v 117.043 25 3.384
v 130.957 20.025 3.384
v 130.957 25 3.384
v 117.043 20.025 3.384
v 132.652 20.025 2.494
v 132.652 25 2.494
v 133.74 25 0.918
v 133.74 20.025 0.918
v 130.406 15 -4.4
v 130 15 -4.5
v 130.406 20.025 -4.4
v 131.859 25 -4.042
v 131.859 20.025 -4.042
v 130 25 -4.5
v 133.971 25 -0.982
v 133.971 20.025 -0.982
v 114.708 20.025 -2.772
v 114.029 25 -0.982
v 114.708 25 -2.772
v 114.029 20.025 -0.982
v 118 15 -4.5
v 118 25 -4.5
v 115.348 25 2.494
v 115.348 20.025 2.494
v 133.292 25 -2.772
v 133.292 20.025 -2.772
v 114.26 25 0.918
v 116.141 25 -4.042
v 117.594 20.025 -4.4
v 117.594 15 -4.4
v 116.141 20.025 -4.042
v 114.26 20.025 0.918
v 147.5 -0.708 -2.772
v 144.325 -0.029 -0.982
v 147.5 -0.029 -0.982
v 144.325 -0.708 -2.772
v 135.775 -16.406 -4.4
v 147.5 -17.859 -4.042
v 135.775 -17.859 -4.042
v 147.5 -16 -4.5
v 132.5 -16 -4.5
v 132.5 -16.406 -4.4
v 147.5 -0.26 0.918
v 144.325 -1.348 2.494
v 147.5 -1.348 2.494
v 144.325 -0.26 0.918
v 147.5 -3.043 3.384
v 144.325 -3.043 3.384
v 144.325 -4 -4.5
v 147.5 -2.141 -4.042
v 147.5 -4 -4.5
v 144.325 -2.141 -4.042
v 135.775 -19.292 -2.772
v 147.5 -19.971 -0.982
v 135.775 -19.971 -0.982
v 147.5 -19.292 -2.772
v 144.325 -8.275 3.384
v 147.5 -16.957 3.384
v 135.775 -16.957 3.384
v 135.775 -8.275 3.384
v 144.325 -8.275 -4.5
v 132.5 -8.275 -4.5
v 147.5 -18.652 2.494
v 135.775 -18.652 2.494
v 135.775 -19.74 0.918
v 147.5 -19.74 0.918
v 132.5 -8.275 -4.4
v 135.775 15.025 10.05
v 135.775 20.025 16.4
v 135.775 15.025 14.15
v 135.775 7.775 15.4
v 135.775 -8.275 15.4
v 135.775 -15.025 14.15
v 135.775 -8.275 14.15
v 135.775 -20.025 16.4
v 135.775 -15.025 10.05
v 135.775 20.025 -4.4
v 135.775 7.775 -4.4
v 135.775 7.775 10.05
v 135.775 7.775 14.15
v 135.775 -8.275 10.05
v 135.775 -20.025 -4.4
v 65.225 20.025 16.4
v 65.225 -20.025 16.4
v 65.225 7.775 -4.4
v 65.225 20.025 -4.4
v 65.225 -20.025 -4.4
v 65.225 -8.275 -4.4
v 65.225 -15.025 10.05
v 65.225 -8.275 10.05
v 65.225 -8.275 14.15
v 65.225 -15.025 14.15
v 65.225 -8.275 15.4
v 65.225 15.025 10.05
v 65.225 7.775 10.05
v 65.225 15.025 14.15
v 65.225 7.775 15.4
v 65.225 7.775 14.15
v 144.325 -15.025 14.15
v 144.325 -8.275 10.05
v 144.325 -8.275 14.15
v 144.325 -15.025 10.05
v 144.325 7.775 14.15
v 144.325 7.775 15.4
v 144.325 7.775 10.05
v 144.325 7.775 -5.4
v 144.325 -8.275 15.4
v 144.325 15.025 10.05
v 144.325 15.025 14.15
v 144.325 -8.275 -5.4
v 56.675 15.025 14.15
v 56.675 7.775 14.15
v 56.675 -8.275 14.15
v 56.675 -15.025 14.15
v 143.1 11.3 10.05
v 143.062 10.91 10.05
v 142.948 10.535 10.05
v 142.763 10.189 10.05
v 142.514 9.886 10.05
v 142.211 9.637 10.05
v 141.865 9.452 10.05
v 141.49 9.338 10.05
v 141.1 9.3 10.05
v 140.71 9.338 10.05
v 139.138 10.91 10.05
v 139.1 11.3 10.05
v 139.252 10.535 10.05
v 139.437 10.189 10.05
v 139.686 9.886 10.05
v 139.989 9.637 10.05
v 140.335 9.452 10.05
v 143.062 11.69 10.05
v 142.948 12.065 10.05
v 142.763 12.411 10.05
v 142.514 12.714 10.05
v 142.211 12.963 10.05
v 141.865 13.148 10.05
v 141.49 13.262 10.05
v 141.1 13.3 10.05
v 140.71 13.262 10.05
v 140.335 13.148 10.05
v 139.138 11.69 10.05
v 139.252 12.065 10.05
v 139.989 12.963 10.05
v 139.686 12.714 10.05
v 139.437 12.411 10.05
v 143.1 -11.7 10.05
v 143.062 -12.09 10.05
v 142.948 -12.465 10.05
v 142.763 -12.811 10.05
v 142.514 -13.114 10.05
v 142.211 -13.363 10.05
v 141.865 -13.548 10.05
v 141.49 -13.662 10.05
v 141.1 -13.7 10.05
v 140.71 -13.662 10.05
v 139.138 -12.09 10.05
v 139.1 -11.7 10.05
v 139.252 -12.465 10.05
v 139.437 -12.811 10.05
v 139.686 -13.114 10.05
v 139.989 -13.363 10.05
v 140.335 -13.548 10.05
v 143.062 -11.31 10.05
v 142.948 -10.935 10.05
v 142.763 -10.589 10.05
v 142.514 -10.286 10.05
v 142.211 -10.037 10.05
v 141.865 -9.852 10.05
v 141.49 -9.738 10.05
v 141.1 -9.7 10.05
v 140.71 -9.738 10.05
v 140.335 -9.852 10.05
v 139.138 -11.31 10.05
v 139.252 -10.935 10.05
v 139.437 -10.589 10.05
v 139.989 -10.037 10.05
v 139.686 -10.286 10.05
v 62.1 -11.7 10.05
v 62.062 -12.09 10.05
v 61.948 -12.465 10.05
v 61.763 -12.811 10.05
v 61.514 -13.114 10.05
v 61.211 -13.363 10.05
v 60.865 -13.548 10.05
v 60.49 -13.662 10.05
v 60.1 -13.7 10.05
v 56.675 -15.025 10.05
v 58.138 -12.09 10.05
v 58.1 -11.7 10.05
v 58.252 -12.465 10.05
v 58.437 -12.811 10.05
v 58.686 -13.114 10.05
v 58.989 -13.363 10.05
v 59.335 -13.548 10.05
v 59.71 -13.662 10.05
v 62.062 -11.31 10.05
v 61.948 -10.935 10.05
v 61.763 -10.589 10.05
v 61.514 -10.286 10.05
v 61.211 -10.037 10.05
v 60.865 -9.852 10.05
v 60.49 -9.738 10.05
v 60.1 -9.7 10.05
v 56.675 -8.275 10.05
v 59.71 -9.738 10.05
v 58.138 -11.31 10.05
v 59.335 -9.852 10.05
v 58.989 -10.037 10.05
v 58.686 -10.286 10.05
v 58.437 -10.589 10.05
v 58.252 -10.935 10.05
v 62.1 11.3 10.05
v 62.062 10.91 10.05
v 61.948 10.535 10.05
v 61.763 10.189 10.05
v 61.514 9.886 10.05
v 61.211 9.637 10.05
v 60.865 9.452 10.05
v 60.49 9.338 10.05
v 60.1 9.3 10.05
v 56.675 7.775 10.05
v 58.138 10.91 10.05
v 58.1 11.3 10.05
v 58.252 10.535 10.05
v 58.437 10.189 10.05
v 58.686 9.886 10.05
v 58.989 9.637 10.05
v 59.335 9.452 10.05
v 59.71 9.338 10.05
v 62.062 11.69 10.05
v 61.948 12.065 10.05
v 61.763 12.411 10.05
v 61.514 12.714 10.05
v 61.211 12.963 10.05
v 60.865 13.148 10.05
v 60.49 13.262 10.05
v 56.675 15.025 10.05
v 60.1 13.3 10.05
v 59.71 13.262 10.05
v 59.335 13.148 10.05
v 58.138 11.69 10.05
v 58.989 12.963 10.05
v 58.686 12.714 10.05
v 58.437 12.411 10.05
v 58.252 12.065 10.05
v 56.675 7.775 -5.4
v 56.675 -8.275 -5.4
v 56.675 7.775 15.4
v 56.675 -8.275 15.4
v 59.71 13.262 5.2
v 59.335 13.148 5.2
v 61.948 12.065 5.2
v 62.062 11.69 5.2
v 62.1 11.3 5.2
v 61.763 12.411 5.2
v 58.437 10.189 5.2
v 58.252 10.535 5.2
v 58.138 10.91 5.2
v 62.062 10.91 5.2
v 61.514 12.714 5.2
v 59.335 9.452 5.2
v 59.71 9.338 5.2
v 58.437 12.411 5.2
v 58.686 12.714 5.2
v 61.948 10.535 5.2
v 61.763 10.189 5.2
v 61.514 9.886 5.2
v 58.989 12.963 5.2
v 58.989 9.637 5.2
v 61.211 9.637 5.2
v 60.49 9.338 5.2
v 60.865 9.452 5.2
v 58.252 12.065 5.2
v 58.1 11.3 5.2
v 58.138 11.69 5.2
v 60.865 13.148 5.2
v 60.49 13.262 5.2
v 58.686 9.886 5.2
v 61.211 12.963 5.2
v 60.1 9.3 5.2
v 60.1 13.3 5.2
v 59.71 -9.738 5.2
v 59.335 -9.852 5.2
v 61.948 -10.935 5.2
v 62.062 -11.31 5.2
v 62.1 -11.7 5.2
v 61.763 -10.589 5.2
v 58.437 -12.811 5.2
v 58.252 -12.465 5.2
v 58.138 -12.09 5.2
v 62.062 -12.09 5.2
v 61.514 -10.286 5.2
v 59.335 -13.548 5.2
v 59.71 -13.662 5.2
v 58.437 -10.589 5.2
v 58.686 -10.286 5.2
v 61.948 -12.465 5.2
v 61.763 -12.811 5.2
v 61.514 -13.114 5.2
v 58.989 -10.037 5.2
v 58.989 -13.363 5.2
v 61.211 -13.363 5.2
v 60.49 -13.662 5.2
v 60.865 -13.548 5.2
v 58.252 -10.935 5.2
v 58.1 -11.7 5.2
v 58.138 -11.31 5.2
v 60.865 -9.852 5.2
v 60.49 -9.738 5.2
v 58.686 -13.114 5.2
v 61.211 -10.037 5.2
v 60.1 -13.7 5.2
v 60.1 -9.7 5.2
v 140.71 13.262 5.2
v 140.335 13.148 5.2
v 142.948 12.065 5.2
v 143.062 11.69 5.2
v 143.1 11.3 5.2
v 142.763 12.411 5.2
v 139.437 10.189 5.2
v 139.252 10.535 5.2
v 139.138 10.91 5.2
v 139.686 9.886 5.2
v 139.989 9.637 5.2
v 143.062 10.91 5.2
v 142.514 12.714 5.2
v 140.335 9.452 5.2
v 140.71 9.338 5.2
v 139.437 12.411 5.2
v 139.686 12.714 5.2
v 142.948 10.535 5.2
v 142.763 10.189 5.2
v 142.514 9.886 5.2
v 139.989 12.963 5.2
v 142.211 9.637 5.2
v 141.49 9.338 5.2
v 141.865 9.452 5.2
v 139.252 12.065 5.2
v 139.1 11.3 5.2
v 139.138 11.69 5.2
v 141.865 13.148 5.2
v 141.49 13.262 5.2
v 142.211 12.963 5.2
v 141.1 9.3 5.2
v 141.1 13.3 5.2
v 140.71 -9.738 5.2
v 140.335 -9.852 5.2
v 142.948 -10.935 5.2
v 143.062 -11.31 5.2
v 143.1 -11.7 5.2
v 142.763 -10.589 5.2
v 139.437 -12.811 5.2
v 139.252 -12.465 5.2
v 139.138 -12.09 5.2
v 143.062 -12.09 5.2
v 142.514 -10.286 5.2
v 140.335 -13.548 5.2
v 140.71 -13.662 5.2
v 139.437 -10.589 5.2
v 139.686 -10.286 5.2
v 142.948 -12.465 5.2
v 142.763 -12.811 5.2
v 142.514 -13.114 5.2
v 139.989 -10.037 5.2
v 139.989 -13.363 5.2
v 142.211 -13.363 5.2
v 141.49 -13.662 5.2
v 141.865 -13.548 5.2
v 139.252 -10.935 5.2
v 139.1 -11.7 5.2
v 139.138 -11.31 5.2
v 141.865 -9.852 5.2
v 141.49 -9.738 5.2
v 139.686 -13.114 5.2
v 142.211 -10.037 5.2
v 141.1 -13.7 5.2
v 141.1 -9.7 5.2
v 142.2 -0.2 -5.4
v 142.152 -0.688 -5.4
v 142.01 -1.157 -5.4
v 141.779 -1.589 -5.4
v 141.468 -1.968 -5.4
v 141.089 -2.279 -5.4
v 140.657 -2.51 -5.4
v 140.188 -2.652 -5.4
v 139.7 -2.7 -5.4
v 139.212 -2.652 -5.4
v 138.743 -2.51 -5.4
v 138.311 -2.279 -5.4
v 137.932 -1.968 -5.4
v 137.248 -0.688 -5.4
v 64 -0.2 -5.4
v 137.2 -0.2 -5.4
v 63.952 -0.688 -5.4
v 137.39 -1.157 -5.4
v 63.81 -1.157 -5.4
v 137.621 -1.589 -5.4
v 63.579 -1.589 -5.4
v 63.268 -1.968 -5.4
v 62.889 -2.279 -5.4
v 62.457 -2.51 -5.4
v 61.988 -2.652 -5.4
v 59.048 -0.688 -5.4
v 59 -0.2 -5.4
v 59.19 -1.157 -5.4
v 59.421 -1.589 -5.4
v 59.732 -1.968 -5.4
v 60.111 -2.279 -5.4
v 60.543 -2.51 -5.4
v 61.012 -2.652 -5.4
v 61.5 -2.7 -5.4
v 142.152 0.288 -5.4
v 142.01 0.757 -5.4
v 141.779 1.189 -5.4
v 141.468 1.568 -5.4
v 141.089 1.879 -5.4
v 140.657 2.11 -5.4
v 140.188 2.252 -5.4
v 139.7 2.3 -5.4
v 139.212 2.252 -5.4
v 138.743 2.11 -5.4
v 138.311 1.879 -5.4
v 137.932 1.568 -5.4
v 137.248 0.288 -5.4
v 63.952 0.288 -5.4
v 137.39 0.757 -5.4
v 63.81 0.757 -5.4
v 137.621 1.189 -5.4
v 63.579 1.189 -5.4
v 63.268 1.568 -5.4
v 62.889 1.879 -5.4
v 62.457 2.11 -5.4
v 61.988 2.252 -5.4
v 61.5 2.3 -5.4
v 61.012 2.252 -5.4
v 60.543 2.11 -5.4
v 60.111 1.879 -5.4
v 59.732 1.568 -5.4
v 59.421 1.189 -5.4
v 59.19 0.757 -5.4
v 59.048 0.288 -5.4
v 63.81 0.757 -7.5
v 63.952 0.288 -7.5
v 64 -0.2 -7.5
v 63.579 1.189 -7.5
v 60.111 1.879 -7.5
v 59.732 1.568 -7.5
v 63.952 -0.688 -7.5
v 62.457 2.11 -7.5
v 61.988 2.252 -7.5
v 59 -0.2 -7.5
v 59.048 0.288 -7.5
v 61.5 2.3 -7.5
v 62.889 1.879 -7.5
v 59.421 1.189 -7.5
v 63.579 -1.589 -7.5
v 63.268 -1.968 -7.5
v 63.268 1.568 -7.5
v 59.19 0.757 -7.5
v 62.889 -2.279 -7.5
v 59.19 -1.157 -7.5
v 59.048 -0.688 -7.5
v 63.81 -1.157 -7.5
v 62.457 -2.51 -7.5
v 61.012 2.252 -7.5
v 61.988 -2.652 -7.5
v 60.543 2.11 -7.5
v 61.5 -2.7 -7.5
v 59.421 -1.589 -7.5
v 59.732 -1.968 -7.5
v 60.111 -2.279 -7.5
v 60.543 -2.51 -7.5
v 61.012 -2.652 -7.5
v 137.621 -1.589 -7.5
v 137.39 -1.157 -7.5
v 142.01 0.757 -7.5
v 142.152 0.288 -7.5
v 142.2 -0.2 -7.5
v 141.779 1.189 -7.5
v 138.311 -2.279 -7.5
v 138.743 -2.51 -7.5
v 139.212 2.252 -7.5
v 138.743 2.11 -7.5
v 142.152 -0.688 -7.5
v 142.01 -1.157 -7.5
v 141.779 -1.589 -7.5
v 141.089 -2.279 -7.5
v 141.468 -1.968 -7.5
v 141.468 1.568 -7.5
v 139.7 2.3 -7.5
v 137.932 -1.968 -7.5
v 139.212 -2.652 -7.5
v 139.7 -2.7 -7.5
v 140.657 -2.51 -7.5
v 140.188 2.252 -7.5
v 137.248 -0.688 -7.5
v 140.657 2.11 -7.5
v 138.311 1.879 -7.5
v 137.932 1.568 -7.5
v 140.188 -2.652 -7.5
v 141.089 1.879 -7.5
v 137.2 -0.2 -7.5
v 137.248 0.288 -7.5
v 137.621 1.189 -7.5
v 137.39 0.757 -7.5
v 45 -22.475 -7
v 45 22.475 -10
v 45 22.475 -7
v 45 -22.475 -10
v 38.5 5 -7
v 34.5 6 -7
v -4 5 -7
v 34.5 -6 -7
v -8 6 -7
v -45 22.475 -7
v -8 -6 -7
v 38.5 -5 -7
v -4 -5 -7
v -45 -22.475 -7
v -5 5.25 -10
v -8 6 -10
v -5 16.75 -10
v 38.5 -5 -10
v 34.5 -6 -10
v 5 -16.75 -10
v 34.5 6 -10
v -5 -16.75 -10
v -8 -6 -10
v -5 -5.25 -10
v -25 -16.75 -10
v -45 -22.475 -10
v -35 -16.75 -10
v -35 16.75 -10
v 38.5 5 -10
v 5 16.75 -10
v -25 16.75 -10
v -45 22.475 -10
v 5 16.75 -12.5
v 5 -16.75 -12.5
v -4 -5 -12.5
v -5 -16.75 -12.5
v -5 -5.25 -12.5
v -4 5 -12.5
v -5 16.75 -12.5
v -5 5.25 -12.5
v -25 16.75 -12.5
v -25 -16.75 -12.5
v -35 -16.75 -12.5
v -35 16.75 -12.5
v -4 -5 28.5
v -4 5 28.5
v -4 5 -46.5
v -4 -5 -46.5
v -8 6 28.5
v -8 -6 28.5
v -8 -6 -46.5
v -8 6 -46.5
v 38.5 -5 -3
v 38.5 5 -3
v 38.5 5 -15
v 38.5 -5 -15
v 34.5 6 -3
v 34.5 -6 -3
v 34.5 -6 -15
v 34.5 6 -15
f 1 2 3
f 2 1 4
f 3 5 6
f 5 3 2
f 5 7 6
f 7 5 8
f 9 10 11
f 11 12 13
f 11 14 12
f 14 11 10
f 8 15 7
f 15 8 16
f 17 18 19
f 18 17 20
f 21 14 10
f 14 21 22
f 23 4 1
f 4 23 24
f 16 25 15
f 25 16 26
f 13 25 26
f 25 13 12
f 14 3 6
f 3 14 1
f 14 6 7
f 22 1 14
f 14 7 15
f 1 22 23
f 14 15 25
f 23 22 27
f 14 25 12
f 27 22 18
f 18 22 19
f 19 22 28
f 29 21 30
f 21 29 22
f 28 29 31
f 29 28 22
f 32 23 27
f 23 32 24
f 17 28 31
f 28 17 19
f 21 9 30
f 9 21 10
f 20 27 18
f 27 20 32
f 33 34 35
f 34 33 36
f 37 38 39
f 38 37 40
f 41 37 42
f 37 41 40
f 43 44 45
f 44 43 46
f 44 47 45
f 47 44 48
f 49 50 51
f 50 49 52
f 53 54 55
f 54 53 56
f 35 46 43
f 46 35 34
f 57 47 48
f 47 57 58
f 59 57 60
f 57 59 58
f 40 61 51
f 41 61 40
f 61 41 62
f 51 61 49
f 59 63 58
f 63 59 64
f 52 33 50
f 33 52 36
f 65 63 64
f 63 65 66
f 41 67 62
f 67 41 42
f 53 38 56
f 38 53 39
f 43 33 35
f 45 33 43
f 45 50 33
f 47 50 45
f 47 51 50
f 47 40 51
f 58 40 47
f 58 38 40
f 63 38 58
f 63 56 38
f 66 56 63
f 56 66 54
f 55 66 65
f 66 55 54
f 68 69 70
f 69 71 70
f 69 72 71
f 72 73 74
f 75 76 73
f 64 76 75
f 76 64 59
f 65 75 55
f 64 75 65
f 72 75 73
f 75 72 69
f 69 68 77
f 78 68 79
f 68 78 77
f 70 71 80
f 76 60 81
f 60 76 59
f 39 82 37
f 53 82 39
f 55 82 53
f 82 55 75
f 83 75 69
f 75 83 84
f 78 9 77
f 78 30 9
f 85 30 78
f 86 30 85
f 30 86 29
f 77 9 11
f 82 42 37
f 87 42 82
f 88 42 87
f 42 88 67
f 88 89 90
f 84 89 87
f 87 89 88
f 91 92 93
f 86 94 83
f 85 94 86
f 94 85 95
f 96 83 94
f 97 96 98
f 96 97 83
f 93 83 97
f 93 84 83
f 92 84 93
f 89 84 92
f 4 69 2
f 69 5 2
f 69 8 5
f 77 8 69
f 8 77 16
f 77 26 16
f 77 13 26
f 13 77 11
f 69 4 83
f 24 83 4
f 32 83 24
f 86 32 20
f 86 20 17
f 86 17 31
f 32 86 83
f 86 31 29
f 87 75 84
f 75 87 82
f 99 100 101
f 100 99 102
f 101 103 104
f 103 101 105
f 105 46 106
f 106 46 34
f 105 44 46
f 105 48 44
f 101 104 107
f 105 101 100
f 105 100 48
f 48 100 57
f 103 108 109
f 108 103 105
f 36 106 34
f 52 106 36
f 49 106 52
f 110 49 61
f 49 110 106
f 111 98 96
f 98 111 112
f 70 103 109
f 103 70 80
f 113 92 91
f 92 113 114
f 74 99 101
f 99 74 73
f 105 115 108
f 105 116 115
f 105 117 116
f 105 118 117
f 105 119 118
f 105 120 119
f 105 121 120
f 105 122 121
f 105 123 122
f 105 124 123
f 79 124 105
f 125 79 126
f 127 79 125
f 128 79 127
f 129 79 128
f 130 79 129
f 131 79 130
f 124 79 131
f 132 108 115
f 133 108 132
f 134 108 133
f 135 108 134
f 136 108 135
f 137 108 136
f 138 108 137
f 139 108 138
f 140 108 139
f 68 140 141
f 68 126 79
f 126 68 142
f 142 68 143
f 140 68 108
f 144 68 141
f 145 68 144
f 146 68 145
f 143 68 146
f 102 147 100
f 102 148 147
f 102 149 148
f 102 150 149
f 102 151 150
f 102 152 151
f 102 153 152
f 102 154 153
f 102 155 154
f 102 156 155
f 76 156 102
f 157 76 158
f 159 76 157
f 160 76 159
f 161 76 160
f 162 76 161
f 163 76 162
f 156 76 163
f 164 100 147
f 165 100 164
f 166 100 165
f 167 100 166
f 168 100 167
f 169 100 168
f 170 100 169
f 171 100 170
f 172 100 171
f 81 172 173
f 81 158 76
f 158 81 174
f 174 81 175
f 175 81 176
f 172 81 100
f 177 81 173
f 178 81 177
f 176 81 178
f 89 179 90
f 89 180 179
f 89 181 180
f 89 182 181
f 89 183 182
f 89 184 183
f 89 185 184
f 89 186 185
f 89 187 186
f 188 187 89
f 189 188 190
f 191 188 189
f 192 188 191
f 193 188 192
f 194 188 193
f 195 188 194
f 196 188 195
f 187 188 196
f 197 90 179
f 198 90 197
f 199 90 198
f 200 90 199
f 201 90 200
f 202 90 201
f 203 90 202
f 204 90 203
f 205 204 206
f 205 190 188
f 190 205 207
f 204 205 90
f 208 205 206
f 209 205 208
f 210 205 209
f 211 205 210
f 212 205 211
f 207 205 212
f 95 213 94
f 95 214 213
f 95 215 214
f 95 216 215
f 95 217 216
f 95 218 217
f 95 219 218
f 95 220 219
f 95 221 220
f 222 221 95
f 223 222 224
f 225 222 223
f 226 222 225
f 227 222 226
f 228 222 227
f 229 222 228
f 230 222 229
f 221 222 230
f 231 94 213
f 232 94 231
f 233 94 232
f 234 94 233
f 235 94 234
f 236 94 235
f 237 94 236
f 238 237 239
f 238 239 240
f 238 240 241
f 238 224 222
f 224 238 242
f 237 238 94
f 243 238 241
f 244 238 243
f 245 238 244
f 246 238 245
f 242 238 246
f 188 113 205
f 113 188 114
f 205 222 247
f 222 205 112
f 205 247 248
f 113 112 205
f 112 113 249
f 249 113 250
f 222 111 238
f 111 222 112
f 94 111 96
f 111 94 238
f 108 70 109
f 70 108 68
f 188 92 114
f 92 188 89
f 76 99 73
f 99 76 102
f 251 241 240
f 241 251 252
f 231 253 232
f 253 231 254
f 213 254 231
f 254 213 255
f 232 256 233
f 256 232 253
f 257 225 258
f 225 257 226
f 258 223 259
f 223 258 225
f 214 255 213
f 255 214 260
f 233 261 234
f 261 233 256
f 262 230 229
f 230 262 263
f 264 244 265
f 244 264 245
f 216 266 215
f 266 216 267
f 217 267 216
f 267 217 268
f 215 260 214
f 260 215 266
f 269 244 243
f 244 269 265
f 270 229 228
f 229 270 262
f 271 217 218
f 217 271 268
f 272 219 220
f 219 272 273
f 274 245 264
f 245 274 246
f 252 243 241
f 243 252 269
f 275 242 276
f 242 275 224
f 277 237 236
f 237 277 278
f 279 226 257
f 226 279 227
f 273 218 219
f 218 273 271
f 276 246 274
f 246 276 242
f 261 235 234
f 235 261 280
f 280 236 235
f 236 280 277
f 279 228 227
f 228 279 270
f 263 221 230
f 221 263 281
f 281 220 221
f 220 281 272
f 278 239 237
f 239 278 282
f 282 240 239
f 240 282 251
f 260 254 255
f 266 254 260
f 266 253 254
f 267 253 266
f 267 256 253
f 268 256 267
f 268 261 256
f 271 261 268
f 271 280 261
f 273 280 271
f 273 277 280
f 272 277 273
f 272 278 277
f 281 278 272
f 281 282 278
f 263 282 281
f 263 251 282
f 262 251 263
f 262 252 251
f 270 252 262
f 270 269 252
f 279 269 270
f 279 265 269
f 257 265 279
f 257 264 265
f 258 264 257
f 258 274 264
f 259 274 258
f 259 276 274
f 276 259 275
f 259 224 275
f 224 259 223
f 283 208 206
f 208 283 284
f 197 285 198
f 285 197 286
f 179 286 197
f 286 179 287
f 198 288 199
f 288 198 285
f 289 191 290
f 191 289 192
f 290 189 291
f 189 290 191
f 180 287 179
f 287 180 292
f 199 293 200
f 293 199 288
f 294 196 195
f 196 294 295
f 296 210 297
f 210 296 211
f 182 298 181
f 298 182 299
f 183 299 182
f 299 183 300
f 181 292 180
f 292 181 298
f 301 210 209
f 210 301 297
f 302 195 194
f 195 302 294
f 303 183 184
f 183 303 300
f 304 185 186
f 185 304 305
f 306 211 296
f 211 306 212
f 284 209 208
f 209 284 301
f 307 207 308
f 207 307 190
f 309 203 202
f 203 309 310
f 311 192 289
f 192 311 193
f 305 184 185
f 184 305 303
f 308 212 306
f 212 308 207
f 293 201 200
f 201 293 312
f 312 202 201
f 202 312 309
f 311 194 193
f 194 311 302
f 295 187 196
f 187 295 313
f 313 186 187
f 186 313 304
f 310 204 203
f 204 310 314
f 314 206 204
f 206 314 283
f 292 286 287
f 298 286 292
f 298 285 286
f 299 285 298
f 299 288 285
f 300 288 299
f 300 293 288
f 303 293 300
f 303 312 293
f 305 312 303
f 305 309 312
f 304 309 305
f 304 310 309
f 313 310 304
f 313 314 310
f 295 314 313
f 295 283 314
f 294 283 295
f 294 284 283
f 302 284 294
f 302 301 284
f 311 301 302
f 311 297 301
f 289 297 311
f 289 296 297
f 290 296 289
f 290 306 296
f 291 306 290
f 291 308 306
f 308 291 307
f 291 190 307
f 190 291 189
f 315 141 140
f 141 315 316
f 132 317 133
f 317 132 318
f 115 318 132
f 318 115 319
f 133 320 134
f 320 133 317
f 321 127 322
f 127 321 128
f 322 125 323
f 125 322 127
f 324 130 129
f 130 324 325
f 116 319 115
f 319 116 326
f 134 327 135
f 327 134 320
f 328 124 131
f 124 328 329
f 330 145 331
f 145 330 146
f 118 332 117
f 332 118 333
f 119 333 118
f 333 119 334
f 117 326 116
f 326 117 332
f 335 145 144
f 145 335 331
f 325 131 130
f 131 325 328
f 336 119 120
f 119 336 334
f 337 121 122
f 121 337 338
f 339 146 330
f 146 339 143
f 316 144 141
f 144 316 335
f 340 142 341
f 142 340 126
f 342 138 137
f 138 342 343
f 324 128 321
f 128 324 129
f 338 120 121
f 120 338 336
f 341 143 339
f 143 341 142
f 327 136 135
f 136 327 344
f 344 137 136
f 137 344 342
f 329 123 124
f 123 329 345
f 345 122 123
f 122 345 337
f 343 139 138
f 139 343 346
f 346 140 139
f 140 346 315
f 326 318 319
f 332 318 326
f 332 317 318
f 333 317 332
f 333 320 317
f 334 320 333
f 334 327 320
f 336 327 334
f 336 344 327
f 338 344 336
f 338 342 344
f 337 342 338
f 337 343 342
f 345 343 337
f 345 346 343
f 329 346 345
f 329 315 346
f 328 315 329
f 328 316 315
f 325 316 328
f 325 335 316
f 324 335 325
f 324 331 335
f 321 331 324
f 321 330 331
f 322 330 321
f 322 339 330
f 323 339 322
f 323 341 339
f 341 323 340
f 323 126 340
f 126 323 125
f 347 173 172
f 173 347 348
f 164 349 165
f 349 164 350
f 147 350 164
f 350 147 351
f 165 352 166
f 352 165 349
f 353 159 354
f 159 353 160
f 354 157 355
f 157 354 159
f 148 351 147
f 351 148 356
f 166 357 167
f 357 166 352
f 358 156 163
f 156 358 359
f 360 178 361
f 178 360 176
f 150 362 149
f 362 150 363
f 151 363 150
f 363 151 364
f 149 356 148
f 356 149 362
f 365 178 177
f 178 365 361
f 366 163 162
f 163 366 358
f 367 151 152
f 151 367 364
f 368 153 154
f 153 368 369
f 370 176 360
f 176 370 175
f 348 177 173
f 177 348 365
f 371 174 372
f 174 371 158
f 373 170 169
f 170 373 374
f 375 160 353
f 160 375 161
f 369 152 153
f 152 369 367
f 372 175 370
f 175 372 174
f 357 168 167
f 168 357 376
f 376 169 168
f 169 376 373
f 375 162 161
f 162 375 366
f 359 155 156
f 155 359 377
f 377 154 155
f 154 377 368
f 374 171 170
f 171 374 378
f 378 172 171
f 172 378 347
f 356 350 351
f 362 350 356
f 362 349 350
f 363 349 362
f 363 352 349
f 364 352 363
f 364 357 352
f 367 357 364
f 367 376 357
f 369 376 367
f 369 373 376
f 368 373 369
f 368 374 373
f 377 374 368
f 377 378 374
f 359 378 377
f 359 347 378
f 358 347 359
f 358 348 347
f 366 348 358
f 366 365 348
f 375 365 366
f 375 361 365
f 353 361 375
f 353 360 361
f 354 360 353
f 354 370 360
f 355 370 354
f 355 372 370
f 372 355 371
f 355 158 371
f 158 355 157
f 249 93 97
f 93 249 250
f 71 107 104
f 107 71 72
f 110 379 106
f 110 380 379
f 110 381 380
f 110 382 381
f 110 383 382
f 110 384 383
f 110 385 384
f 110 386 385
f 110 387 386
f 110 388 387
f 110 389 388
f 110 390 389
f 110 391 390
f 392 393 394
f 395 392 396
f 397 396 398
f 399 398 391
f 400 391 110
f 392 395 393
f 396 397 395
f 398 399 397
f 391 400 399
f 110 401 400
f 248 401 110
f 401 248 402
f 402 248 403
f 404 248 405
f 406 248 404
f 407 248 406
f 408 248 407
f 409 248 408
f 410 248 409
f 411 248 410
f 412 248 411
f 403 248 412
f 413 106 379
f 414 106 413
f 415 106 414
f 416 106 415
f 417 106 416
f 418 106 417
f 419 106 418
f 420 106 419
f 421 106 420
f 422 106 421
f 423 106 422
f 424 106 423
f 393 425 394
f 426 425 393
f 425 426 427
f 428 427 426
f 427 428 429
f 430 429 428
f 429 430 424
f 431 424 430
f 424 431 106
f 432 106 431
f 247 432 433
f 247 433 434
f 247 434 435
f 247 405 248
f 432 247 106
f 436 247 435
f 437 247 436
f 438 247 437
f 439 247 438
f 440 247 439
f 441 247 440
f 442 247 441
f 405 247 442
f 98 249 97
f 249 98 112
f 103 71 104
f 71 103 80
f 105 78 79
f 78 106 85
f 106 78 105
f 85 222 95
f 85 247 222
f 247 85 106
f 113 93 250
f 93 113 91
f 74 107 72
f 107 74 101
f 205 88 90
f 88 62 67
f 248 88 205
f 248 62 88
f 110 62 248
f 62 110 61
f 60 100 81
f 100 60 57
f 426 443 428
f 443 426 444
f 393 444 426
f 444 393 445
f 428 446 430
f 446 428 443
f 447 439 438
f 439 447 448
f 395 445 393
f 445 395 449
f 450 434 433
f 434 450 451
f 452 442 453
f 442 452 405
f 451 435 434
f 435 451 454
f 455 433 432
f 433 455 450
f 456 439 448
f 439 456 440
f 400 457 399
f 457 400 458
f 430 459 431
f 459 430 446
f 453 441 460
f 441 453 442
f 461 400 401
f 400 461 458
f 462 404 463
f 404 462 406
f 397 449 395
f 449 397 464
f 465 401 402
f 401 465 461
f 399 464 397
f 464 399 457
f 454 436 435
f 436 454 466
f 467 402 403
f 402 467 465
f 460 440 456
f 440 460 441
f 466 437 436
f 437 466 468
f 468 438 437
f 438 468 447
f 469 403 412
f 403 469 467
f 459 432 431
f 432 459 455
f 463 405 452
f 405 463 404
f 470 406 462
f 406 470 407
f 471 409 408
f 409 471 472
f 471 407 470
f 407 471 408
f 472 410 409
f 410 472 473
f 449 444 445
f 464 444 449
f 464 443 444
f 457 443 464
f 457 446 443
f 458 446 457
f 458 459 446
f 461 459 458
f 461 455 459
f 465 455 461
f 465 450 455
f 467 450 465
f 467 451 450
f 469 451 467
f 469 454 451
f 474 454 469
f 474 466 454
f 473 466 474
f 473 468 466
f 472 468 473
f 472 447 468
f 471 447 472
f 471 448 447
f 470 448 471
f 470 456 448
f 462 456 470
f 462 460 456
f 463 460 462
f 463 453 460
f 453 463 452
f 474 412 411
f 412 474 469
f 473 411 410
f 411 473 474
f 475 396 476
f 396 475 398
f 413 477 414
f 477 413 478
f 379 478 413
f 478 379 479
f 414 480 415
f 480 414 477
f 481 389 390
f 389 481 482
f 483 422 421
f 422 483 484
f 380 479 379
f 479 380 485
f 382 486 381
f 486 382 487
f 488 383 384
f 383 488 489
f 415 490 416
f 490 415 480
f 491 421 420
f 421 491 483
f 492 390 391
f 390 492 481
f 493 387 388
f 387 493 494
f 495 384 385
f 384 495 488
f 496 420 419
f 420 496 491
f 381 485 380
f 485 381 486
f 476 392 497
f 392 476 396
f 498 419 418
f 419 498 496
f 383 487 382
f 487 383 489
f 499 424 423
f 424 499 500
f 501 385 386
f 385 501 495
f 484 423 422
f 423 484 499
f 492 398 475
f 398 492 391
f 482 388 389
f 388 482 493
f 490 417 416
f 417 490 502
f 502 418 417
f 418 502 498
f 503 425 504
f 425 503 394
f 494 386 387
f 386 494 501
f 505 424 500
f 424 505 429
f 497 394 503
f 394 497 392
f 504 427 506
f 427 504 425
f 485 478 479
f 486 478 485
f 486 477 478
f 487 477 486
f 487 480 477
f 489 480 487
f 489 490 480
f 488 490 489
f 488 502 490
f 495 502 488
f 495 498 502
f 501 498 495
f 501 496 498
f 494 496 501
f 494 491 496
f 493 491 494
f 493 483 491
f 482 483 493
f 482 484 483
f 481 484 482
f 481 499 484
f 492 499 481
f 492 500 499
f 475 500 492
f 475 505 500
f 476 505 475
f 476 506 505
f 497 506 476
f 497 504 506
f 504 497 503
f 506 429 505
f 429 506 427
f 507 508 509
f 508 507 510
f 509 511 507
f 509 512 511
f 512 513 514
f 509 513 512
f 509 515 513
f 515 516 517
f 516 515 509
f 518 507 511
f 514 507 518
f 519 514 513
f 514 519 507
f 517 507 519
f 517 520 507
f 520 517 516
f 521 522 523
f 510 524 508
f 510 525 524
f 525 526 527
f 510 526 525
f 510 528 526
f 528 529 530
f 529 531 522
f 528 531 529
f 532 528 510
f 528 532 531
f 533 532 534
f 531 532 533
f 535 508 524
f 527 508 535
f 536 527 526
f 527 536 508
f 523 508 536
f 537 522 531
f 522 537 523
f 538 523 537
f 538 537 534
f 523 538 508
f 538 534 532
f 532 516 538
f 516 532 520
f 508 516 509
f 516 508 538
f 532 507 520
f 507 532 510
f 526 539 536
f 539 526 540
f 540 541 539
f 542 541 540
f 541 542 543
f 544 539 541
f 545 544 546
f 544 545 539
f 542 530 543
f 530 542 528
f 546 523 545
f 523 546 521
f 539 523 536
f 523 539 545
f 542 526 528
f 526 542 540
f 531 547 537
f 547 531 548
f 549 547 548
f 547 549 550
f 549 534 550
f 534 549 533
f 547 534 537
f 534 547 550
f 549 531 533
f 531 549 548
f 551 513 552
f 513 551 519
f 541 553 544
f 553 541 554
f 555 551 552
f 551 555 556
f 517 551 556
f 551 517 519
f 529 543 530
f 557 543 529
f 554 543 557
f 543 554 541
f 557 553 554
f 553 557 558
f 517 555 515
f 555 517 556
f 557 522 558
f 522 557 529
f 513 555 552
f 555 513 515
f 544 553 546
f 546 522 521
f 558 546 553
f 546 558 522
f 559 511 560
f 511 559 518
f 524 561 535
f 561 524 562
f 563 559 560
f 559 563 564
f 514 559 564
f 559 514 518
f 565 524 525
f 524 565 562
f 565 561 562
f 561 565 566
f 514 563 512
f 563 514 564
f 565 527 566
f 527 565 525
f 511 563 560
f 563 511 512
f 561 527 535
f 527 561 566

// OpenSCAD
// file: BOSL2/std.scad
// Minimal BOSL2 compatibility shim for bundled gallery models.
// It implements only the helpers used by the imported OpenSCAD projects.

CENTER = [0, 0, 0];
BOTTOM = [0, 0, -1];
TOP = [0, 0, 1];
LEFT = [-1, 0, 0];
RIGHT = [1, 0, 0];
FRONT = [0, -1, 0];
BACK = [0, 1, 0];

module up(z=0) {
    translate([0, 0, z]) children();
}

module down(z=0) {
    translate([0, 0, -z]) children();
}

module attach(anchor=CENTER) {
    children();
}

module cuboid(size=[1, 1, 1], anchor=CENTER) {
    center = anchor == CENTER;
    translate(center ? [0, 0, 0] : [0, 0, size[2] / 2])
        cube(size, center=true);
    children();
}

module xcyl(h=1, r=1, anchor=CENTER) {
    center = anchor == CENTER;
    translate(center ? [0, 0, 0] : [h / 2, 0, 0])
        rotate([0, 90, 0])
            cylinder(h=h, r=r, center=true);
}
// file: BOSL2/joiners.scad
// Minimal dovetail approximation for bundled gallery models.

module dovetail(type="male", slide=10, width=10, height=4, back_width=12, spin=0) {
    profile = type == "female"
        ? [[-back_width / 2, -height / 2], [back_width / 2, -height / 2], [width / 2, height / 2], [-width / 2, height / 2]]
        : [[-width / 2, -height / 2], [width / 2, -height / 2], [back_width / 2, height / 2], [-back_width / 2, height / 2]];

    rotate([0, 0, spin])
        linear_extrude(height=slide, center=true)
            polygon(profile);
}
// main file
// External Libraries
include <BOSL2/joiners.scad>
include <BOSL2/std.scad>

tol = 0.05;

module humbucker(tol = tol, cut = false, holes = true)
{
    translate([ 0.5, 0, 2 ]) cuboid([ 70.5 + tol, 40 + tol, 20.8 ], rounding = 3,
                                    edges = [ FRONT + RIGHT, FRONT + LEFT, BACK + RIGHT, BACK + LEFT ], $fn = 32);
    translate([ 0.5, 0, 8.1 ]) cuboid([ 87.6 + tol, 30 + tol, 4.1 ], rounding = 3,
                                      edges = [ FRONT + RIGHT, FRONT + LEFT, BACK + RIGHT, BACK + LEFT ], $fn = 32);
    // upper holes
    translate([ -39.9, 11.3, 1.2 ]) cylinder(h = 5, d = 4, $fn = 32);
    translate([ -39.9, -11.7, 1.2 ]) cylinder(h = 5, d = 4, $fn = 32);
    translate([ 41.1, 11.3, 1.2 ]) cylinder(h = 5, d = 4, $fn = 32);
    translate([ 41.1, -11.7, 1.2 ]) cylinder(h = 5, d = 4, $fn = 32);

    translate([ 0.5, -0.25, 1 ]) cuboid([ 87.6 + tol, 16 + tol, 20.8 ], rounding = 7,
                                        edges = [ FRONT + RIGHT, FRONT + LEFT, BACK + RIGHT, BACK + LEFT ], $fn = 32);
    // Lower Holes
    translate([ -38.5, -0.2, -10 ]) cylinder(h = 3, d = 5, $fn = 32, center = true);
    translate([ 39.7, -0.2, -10 ]) cylinder(h = 3, d = 5, $fn = 32, center = true);

    // Cable Holes
    if (holes == true)
    {
        translate([ 18, 20, -4.5 ]) hull()
        {
            rotate([ 90, 90, 0 ]) cylinder(h = 10, d = 8, center = true);
            translate([ 12, 0, 0 ]) rotate([ 90, 90, 0 ]) cylinder(h = 10, d = 8, center = true);
        }
        // Cable Holes
        translate([ 40, -16, -4.5 ]) hull()
        {
            rotate([ 0, 90, 0 ]) cylinder(h = 15, d = 8, center = true);
            translate([ 0, 12, 0 ]) rotate([ 0, 90, 0 ]) cylinder(h = 15, d = 8, center = true);
        }
    }
}

module humbucker_cradle(cut, holes, tol)
{
    if (cut == true)
    {
        union()
        {
            cube([ 90, 45 - tol, 20 ], center = true);
            translate([ -6.5, 0, -11 ]) cube([ 77, 33, 5 ], center = true);
            translate([ -6.5, 0, -10 ]) rotate([ 0, 0, 90 ]) dovetail(
                "female", w = 30, h = 5, slide = 86, $slop = tol, angle = -30, radius = 0.25, round = true, $fn = 32);
            translate([ 36.5, 0, -10 ]) rotate([ 0, 0, 90 ]) dovetail(
                "female", w = 20, h = 5, slide = 12, taper = -1, $slop = tol, radius = 0.25, round = true, $fn = 32);
            // translate([ 38, 0, -12 ]) cube([ 10 + 0.2, 8 + 0.2, 5 ], center = true);

            // translate([ 38, 5, -12.5 ]) cuboid([ 10, 25, 5 ], rounding = 3, edges = [RIGHT + BOTTOM], $fn = 32);
        }
    }
    else
    {
        difference()
        {
            union()
            {
                cube([ 90, 45 - tol, 20 ], center = true);
                translate([ 0, 0, -10 ]) cube([ 10, 33, 5 ], center = true);
                translate([ -6, 0, -9 ]) rotate([ 0, 180, 90 ]) dovetail(
                    "male", w = 30, h = 5, slide = 75, angle = -30, $slop = tol, radius = 0.25, round = true, $fn = 32);
                translate([ 36.5, 0, -9 ]) rotate([ 0, 180, 90 ])
                    dovetail("male", w = 19.4, h = 5, slide = 12, taper = -1, $slop = tol, radius = 0.25, round = true,
                             $fn = 32);
            }
            translate([ 0.5, 0, 2 ])
                cuboid([ 70.5 + tol, 40 + tol, 20.8 ], rounding = 3,
                       edges = [ FRONT + RIGHT, FRONT + LEFT, BACK + RIGHT, BACK + LEFT ], $fn = 32);
            translate([ 0.5, 0, 8.1 ])
                cuboid([ 87.6 + tol, 30 + tol, 4.1 ], rounding = 3,
                       edges = [ FRONT + RIGHT, FRONT + LEFT, BACK + RIGHT, BACK + LEFT ], $fn = 32);
            // upper holes
            translate([ -39.9, 11.3, 1.2 ]) cylinder(h = 5, d = 4, $fn = 32);
            translate([ -39.9, -11.7, 1.2 ]) cylinder(h = 5, d = 4, $fn = 32);
            translate([ 41.1, 11.3, 1.2 ]) cylinder(h = 5, d = 4, $fn = 32);
            translate([ 41.1, -11.7, 1.2 ]) cylinder(h = 5, d = 4, $fn = 32);

            translate([ 0.5, -0.25, 1 ])
                cuboid([ 87.6 + tol, 16 + tol, 20.8 ], rounding = 7,
                       edges = [ FRONT + RIGHT, FRONT + LEFT, BACK + RIGHT, BACK + LEFT ], $fn = 32);
            // Lower Holes
            translate([ -38.5, -0.2, -10 ]) cylinder(h = 3, d = 5, $fn = 32, center = true);
            translate([ 39.7, -0.2, -10 ]) cylinder(h = 3, d = 5, $fn = 32, center = true);

            // Cable Holes
            if (holes == true)
            {
                translate([ 18, 20, -4.5 ]) hull()
                {
                    rotate([ 90, 90, 0 ]) cylinder(h = 10, d = 8, center = true);
                    translate([ 12, 0, 0 ]) rotate([ 90, 90, 0 ]) cylinder(h = 10, d = 8, center = true);
                }
                // Cable Holes
                translate([ 40, -16, -4.5 ]) hull()
                {
                    rotate([ 0, 90, 0 ]) cylinder(h = 15, d = 8, center = true);
                    translate([ 0, 12, 0 ]) rotate([ 0, 90, 0 ]) cylinder(h = 15, d = 8, center = true);
                }
            }
        }
    }
}
translate([ 100, 0, 4 ]) humbucker(cut = false, holes = true, tol = 0.05);

// translate([-100,0,0])
// #humbucker(cut = true, holes = true, tol = 0.05);
union()
{
    translate([ 0, 0, -8.5 ]) cube([ 90, 45 - tol, 3 ], center = true);
    translate([ 0, 0, -10 ]) cube([ 10, 33.5, 5 ], center = true);
    translate([ -30, 0, -10 ]) cube([ 10, 33.5, 5 ], center = true);
    translate([ -6, 0, -9 ]) rotate([ 0, 180, 90 ])
        dovetail("male", w = 30, h = 5, slide = 75, angle = -30, $slop = tol, radius = 0.25, round = true, $fn = 32);
    translate([ 36.5, 0, -9 ]) rotate([ 0, 180, 90 ])
        dovetail("male", w = 19.75, h = 5, slide = 12, taper = -1, $slop = tol, radius = 0.25, round = true, $fn = 32);
    // translate([38,0,-12]) cube([10,20,5], center=true);
}
